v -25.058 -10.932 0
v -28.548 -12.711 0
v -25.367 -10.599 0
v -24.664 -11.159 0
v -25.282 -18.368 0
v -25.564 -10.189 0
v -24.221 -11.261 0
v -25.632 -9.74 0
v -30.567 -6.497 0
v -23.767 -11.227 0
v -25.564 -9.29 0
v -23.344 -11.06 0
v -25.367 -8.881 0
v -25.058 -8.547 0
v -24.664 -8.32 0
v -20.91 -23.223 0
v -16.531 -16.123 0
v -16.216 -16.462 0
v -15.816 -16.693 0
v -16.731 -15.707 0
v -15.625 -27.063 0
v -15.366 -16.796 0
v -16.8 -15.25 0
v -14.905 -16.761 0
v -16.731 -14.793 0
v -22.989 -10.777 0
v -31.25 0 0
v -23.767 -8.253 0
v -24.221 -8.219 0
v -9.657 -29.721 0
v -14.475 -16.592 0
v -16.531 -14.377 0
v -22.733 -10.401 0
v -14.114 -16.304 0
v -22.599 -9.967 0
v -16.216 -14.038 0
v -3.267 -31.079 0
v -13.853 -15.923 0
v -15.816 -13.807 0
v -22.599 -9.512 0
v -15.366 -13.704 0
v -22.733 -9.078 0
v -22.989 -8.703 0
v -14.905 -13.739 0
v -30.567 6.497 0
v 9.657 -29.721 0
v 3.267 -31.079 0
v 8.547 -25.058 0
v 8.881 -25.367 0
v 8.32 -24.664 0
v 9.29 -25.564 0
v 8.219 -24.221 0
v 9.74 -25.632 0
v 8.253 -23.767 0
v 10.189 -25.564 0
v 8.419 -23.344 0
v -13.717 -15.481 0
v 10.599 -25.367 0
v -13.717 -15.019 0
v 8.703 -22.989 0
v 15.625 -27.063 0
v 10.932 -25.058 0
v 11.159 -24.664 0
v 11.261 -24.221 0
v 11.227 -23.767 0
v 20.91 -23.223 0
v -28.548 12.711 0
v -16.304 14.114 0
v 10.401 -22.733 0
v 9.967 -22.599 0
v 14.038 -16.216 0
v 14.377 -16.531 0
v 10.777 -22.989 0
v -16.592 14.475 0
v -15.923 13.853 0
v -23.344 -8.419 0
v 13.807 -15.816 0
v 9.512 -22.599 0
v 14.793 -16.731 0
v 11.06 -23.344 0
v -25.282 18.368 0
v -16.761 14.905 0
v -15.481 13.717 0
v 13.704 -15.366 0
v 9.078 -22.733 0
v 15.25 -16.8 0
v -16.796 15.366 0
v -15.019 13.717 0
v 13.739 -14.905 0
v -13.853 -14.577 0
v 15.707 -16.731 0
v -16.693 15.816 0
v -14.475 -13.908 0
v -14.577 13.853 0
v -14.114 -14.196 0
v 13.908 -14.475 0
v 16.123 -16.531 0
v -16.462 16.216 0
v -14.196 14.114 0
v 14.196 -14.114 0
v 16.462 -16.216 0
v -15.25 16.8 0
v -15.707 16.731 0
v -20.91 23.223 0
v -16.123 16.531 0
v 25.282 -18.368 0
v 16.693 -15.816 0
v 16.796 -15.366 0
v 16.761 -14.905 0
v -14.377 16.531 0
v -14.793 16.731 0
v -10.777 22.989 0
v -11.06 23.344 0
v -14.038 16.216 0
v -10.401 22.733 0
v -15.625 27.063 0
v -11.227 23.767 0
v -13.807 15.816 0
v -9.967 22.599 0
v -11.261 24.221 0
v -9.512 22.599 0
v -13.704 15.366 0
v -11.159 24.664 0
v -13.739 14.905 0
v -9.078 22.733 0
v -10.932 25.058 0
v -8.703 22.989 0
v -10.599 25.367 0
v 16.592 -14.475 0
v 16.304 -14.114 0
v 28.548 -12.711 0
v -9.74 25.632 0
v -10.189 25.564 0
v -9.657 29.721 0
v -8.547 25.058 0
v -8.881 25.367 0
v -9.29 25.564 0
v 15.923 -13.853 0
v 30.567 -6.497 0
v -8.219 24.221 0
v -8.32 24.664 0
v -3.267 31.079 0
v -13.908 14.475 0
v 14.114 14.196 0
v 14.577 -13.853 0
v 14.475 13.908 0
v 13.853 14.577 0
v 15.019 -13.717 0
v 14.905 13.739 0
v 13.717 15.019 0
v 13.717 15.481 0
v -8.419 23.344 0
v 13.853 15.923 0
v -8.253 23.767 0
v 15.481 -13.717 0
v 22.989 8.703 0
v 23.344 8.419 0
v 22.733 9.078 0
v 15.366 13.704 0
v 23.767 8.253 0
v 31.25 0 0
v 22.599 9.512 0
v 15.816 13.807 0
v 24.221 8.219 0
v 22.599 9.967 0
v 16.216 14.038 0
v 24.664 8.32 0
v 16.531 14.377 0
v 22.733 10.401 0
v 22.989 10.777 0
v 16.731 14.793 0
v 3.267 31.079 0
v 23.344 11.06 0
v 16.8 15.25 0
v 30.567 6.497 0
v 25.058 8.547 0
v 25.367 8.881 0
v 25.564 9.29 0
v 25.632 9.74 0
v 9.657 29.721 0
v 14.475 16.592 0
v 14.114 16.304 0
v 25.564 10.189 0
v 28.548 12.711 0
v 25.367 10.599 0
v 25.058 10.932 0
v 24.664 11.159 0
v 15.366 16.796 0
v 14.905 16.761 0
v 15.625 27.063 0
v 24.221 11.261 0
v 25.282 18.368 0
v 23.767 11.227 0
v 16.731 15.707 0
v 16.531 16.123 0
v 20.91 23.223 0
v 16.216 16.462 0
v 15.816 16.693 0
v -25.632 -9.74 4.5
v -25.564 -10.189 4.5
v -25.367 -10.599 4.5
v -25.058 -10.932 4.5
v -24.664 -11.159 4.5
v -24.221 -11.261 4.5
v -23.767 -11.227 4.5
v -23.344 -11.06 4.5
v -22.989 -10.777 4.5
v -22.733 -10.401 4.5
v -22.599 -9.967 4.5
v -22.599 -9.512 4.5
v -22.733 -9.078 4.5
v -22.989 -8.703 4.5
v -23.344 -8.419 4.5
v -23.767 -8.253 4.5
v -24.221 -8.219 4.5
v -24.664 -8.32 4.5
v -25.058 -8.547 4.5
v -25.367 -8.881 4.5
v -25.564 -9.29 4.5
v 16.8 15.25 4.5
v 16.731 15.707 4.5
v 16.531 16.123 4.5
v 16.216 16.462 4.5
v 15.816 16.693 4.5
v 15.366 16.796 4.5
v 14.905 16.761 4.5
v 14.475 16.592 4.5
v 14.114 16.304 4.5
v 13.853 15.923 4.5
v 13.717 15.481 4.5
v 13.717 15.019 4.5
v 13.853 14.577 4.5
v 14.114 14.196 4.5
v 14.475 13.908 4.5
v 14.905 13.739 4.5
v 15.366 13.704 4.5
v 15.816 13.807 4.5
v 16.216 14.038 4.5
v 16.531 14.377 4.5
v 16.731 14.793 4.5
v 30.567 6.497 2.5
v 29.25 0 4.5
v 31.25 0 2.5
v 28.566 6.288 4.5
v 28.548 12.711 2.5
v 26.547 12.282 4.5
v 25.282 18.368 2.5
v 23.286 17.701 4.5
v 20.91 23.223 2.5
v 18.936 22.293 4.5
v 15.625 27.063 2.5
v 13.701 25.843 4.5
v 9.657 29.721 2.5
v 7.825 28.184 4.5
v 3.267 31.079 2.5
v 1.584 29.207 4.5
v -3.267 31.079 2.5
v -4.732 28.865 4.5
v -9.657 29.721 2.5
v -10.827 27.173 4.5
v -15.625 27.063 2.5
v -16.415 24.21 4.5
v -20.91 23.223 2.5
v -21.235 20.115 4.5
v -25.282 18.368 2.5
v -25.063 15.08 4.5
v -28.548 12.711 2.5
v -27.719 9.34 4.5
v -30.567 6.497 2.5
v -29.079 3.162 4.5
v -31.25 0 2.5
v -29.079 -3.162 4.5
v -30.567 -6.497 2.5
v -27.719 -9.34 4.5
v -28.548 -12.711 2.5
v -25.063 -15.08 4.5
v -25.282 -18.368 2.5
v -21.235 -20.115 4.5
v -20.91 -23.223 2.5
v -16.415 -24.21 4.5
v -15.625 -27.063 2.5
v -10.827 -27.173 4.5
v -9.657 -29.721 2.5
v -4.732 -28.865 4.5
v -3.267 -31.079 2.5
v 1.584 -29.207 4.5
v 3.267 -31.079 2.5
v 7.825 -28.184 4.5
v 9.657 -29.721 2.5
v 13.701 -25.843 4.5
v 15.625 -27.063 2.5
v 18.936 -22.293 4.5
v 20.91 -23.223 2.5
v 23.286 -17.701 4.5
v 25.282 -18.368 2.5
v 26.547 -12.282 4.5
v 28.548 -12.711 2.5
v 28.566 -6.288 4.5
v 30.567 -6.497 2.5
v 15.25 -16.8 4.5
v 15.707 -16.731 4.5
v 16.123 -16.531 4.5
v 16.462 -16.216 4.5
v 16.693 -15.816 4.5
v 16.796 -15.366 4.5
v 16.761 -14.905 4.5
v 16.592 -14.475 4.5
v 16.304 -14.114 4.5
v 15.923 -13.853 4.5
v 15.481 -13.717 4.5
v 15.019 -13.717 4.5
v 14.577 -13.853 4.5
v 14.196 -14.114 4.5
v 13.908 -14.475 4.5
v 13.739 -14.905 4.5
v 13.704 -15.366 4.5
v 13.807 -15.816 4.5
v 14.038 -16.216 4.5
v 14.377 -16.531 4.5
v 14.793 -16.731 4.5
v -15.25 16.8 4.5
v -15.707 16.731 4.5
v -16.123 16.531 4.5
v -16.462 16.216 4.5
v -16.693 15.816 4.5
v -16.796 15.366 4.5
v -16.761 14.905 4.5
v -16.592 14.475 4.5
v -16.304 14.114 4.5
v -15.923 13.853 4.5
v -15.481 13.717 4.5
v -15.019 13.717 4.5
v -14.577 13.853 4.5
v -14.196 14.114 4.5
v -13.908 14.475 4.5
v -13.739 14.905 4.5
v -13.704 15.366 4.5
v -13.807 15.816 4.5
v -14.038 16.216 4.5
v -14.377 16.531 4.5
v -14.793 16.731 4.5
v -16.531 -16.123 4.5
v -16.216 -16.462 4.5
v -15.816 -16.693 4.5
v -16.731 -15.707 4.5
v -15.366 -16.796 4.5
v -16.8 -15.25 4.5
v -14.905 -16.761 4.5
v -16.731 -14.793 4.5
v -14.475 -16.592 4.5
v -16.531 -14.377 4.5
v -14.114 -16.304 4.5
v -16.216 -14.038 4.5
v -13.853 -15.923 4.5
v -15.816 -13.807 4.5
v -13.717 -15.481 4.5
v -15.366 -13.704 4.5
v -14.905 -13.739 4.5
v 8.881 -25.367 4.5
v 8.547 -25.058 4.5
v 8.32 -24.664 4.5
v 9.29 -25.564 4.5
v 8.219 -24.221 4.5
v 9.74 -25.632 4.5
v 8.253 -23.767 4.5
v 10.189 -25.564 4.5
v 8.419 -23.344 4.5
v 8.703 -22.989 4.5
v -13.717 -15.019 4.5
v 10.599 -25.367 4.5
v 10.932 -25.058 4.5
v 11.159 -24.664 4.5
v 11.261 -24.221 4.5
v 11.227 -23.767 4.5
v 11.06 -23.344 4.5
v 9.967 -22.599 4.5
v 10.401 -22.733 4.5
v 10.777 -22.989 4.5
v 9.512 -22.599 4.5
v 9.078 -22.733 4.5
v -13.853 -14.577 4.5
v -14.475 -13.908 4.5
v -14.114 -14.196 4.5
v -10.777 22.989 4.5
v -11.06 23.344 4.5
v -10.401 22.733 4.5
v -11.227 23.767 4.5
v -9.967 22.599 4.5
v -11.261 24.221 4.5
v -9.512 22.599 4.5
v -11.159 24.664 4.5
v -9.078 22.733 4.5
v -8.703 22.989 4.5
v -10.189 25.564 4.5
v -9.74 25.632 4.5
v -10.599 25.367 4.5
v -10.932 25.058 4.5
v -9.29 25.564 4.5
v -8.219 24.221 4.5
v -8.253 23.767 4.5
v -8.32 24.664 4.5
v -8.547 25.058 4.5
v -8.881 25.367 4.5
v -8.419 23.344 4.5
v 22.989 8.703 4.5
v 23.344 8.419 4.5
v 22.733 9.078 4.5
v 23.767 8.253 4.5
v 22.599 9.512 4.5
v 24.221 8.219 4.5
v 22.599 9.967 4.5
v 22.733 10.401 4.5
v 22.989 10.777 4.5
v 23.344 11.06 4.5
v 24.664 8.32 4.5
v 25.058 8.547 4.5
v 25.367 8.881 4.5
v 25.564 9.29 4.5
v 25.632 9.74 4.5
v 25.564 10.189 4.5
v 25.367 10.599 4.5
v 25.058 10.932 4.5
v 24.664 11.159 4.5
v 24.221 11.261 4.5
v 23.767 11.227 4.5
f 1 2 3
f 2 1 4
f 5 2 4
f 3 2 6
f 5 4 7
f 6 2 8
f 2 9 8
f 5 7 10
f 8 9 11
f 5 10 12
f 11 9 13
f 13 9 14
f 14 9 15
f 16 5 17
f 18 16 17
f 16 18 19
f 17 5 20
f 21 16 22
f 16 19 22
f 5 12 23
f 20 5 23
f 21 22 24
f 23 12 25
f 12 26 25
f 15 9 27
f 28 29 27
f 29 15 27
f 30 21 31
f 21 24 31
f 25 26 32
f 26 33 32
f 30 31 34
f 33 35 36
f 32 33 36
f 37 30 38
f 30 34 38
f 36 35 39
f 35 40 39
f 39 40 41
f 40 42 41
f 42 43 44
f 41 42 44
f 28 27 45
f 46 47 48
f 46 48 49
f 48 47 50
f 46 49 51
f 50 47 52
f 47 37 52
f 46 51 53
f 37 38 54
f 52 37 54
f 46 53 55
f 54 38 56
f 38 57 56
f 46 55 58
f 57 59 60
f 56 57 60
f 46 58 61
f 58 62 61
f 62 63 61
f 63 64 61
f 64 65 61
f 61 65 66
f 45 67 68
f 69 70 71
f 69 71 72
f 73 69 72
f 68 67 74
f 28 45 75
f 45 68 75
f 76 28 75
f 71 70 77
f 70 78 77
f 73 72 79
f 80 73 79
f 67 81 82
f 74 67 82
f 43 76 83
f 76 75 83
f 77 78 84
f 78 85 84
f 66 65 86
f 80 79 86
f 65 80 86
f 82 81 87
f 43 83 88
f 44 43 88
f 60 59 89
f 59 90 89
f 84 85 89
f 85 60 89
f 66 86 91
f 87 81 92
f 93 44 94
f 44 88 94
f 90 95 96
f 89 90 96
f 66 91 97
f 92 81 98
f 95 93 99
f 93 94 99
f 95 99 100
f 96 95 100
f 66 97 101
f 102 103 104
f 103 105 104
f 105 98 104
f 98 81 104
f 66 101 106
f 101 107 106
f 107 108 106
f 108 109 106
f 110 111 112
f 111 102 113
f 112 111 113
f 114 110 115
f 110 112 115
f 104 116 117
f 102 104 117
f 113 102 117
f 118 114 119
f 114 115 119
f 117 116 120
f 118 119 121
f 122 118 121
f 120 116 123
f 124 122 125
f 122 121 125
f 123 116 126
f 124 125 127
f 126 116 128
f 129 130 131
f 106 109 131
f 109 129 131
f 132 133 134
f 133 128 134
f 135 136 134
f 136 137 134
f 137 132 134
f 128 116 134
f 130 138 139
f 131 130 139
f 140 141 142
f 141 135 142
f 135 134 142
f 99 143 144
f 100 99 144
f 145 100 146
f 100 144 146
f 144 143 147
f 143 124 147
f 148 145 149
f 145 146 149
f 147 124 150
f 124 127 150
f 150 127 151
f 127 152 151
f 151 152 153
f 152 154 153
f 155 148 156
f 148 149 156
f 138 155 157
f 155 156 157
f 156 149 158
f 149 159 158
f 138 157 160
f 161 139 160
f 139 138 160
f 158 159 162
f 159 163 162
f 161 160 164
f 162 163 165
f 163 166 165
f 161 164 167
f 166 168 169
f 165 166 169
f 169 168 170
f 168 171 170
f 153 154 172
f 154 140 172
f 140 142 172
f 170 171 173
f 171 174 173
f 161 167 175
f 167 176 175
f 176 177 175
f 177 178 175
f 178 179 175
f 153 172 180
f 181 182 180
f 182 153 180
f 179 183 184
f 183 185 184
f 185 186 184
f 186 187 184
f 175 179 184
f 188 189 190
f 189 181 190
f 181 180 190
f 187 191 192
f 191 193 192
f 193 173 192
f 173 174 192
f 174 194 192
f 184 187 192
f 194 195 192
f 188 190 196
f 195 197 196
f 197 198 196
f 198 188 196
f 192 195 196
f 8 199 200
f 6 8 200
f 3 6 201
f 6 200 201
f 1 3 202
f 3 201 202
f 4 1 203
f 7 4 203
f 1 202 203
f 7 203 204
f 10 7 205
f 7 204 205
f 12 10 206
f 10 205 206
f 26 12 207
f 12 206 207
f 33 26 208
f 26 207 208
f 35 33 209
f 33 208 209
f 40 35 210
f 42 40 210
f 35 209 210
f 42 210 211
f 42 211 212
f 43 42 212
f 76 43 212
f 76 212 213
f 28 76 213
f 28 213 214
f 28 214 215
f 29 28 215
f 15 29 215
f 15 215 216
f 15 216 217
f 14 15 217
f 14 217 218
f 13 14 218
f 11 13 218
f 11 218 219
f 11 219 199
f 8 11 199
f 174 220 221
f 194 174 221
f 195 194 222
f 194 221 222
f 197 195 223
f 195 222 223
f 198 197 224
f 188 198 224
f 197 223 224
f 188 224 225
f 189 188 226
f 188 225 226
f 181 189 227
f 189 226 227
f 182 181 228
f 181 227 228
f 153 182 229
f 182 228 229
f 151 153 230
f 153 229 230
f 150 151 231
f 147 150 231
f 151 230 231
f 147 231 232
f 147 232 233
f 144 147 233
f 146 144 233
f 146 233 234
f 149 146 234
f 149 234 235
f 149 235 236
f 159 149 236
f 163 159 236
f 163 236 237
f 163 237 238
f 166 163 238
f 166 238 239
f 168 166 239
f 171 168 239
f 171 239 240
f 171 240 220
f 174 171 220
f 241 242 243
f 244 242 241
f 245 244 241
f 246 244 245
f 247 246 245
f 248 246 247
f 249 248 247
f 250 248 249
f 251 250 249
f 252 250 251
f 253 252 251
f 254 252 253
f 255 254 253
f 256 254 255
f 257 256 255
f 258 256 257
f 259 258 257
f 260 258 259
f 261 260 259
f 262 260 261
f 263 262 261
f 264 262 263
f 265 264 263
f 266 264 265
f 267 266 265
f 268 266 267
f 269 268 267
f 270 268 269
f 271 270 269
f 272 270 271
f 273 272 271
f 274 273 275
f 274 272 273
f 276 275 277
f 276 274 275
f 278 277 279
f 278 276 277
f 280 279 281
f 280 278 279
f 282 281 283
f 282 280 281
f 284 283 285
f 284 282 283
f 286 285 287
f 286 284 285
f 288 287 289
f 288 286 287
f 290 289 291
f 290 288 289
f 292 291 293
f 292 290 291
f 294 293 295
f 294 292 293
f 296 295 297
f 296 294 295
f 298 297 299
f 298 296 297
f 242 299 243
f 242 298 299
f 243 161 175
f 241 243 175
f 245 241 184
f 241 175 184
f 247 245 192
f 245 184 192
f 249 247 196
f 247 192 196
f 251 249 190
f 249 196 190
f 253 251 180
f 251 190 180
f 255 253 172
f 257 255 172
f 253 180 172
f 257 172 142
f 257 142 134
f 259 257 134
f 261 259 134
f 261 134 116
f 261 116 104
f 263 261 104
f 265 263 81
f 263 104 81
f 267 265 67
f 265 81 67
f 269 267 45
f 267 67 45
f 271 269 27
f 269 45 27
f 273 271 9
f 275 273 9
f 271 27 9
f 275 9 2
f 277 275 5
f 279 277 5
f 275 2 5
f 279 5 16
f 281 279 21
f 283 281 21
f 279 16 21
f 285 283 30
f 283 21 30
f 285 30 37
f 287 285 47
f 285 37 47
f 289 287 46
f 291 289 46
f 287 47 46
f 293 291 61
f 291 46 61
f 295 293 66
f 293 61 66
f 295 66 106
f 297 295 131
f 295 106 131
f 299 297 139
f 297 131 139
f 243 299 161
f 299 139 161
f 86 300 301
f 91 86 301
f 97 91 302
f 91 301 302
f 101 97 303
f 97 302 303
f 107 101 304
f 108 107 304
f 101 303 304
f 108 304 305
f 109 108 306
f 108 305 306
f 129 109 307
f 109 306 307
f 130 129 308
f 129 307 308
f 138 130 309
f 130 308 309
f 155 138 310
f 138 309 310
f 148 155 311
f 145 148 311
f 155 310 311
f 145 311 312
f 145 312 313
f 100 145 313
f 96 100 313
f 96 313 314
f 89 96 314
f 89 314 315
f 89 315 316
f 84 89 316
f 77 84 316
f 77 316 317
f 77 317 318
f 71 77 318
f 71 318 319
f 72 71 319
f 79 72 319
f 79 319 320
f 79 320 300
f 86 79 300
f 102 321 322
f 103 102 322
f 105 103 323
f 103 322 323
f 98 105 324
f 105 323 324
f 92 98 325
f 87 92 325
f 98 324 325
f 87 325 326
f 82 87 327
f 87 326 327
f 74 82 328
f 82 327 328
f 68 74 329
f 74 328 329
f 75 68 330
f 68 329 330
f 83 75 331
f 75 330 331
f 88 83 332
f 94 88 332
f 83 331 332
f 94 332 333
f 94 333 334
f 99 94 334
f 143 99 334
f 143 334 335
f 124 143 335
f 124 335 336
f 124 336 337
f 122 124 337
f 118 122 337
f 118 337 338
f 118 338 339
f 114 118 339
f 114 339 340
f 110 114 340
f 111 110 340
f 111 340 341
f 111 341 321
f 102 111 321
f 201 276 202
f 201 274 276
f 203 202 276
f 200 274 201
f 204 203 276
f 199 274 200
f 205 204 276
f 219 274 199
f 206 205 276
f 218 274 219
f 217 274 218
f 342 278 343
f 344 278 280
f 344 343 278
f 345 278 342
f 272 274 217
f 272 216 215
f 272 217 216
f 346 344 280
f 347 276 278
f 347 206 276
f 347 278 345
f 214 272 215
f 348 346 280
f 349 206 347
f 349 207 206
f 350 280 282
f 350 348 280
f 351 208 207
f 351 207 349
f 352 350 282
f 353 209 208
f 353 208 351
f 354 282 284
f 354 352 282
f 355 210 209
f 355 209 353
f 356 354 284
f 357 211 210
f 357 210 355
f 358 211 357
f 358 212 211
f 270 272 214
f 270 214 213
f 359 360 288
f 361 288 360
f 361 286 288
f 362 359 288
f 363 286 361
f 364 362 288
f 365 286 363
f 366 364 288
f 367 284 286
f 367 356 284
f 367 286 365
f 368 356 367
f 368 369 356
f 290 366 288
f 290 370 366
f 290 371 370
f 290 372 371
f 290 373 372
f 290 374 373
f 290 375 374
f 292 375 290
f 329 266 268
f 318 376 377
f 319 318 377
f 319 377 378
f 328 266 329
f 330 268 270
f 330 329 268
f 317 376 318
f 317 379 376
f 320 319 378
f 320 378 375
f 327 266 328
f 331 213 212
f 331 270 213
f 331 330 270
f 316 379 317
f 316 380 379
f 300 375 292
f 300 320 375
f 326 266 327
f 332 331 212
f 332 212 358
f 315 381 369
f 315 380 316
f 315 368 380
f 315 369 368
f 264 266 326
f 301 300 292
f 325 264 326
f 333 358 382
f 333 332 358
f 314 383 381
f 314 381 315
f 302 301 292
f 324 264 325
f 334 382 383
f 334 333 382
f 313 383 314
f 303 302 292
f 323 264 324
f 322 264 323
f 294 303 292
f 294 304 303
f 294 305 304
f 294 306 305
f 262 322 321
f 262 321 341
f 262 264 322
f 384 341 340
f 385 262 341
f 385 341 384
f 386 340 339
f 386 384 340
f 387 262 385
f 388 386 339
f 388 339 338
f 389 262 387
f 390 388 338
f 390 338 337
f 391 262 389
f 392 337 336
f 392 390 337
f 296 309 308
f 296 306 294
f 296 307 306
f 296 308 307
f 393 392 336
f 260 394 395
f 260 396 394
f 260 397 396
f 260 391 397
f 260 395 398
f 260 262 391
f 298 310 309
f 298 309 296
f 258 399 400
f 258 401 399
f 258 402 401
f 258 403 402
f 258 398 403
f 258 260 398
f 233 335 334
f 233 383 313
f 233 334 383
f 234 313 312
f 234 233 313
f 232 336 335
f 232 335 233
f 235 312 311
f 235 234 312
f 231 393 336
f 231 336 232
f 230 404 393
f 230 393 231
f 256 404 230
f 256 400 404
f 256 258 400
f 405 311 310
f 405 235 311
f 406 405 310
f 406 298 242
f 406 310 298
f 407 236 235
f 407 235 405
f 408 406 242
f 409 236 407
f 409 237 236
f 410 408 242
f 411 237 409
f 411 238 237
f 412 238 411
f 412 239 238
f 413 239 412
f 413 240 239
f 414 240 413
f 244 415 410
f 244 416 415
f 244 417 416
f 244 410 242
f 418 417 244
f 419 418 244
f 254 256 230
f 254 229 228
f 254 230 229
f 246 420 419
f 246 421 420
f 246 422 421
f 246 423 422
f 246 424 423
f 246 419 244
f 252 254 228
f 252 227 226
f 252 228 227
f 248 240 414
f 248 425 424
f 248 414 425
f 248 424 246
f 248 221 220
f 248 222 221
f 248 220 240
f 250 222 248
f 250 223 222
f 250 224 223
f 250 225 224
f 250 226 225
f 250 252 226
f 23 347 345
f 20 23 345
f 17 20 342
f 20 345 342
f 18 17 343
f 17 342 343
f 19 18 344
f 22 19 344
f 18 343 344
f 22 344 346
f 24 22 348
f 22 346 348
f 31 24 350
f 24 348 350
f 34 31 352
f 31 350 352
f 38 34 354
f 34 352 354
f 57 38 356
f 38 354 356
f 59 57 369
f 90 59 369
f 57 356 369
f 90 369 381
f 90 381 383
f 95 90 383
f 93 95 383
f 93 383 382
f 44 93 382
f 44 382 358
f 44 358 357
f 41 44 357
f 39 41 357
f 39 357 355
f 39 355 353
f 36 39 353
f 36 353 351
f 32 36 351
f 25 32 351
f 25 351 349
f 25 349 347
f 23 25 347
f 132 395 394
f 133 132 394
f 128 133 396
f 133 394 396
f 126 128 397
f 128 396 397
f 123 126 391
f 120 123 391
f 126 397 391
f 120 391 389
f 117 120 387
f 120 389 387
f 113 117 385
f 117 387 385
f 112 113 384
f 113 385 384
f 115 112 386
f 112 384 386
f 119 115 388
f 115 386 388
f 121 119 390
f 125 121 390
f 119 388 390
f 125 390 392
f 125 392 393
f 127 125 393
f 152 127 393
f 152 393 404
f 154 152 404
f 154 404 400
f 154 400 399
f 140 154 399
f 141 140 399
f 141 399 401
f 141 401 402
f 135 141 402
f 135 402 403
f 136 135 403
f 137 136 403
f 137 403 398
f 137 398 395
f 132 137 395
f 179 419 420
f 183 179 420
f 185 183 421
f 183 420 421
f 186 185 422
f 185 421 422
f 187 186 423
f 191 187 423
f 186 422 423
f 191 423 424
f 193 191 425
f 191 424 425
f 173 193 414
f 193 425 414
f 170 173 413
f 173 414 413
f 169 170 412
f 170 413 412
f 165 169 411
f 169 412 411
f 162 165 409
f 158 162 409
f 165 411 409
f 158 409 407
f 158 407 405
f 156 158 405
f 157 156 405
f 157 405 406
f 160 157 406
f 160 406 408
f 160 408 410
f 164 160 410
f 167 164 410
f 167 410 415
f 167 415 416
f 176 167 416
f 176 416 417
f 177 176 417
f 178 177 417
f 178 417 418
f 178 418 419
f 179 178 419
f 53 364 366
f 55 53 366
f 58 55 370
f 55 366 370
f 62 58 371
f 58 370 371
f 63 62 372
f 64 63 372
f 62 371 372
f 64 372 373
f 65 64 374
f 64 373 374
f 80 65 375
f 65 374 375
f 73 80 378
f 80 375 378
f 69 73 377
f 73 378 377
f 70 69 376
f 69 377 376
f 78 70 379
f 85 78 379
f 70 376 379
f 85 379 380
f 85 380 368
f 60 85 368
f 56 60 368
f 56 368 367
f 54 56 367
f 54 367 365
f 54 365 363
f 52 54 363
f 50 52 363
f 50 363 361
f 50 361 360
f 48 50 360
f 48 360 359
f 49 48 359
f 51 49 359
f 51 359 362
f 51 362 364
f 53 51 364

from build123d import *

# Parameters (mm, degrees)
F0_R            = 31.25
F1_DEPTH        = 4.5
F2_R            = 1.525
F3_DEPTH        = 4.501
F3_COPIES_COUNT = 4
F4_SIZE         = 2
F5_R            = 1.55
F6_DEPTH        = 4.501
F6_COPIES_COUNT = 4


# Not quite as in the source:
# - a pattern or mirror of a feature is missing from the dataset's text; its kind, count and spacing are read off the source's solid


with BuildPart() as f1:
    # F0 (on Top) → F1 (new body)
    with BuildSketch(Plane.XY):
        Circle(F0_R)
    extrude(amount=F1_DEPTH)

    # F2 (on face) → F3 (cut, through all)
    with BuildSketch(Plane.XY.offset(4.5)):
        with Locations((24.1067802187, 9.7397714288)):
            Circle(F2_R)
    f3 = extrude(amount=-F3_DEPTH, mode=Mode.SUBTRACT)

    # F3_copies: F3 ×4 about axis
    f3_copies_axis = Axis((0, 0, 0), (0, 0, 1))
    for i in range(1, F3_COPIES_COUNT):
        add(f3.rotate(f3_copies_axis, i * 360 / F3_COPIES_COUNT), mode=Mode.SUBTRACT)

    # F4
    f4_edges = [f1.edges().sort_by_distance(p)[0] for p in [
        (-31.25, 0, 4.5),
    ]]
    chamfer(f4_edges, length=F4_SIZE)

    # F5 (on face) → F6 (cut, through all)
    with BuildSketch(Plane.XY.offset(4.5)):
        with Locations((15.25, 15.25)):
            Circle(F5_R)
    f6 = extrude(amount=-F6_DEPTH, mode=Mode.SUBTRACT)

    # F6_copies: F6 ×4 about axis
    f6_copies_axis = Axis((0, 0, 0), (0, 0, 1))
    for i in range(1, F6_COPIES_COUNT):
        add(f6.rotate(f6_copies_axis, i * 360 / F6_COPIES_COUNT), mode=Mode.SUBTRACT)


solid = f1.part
